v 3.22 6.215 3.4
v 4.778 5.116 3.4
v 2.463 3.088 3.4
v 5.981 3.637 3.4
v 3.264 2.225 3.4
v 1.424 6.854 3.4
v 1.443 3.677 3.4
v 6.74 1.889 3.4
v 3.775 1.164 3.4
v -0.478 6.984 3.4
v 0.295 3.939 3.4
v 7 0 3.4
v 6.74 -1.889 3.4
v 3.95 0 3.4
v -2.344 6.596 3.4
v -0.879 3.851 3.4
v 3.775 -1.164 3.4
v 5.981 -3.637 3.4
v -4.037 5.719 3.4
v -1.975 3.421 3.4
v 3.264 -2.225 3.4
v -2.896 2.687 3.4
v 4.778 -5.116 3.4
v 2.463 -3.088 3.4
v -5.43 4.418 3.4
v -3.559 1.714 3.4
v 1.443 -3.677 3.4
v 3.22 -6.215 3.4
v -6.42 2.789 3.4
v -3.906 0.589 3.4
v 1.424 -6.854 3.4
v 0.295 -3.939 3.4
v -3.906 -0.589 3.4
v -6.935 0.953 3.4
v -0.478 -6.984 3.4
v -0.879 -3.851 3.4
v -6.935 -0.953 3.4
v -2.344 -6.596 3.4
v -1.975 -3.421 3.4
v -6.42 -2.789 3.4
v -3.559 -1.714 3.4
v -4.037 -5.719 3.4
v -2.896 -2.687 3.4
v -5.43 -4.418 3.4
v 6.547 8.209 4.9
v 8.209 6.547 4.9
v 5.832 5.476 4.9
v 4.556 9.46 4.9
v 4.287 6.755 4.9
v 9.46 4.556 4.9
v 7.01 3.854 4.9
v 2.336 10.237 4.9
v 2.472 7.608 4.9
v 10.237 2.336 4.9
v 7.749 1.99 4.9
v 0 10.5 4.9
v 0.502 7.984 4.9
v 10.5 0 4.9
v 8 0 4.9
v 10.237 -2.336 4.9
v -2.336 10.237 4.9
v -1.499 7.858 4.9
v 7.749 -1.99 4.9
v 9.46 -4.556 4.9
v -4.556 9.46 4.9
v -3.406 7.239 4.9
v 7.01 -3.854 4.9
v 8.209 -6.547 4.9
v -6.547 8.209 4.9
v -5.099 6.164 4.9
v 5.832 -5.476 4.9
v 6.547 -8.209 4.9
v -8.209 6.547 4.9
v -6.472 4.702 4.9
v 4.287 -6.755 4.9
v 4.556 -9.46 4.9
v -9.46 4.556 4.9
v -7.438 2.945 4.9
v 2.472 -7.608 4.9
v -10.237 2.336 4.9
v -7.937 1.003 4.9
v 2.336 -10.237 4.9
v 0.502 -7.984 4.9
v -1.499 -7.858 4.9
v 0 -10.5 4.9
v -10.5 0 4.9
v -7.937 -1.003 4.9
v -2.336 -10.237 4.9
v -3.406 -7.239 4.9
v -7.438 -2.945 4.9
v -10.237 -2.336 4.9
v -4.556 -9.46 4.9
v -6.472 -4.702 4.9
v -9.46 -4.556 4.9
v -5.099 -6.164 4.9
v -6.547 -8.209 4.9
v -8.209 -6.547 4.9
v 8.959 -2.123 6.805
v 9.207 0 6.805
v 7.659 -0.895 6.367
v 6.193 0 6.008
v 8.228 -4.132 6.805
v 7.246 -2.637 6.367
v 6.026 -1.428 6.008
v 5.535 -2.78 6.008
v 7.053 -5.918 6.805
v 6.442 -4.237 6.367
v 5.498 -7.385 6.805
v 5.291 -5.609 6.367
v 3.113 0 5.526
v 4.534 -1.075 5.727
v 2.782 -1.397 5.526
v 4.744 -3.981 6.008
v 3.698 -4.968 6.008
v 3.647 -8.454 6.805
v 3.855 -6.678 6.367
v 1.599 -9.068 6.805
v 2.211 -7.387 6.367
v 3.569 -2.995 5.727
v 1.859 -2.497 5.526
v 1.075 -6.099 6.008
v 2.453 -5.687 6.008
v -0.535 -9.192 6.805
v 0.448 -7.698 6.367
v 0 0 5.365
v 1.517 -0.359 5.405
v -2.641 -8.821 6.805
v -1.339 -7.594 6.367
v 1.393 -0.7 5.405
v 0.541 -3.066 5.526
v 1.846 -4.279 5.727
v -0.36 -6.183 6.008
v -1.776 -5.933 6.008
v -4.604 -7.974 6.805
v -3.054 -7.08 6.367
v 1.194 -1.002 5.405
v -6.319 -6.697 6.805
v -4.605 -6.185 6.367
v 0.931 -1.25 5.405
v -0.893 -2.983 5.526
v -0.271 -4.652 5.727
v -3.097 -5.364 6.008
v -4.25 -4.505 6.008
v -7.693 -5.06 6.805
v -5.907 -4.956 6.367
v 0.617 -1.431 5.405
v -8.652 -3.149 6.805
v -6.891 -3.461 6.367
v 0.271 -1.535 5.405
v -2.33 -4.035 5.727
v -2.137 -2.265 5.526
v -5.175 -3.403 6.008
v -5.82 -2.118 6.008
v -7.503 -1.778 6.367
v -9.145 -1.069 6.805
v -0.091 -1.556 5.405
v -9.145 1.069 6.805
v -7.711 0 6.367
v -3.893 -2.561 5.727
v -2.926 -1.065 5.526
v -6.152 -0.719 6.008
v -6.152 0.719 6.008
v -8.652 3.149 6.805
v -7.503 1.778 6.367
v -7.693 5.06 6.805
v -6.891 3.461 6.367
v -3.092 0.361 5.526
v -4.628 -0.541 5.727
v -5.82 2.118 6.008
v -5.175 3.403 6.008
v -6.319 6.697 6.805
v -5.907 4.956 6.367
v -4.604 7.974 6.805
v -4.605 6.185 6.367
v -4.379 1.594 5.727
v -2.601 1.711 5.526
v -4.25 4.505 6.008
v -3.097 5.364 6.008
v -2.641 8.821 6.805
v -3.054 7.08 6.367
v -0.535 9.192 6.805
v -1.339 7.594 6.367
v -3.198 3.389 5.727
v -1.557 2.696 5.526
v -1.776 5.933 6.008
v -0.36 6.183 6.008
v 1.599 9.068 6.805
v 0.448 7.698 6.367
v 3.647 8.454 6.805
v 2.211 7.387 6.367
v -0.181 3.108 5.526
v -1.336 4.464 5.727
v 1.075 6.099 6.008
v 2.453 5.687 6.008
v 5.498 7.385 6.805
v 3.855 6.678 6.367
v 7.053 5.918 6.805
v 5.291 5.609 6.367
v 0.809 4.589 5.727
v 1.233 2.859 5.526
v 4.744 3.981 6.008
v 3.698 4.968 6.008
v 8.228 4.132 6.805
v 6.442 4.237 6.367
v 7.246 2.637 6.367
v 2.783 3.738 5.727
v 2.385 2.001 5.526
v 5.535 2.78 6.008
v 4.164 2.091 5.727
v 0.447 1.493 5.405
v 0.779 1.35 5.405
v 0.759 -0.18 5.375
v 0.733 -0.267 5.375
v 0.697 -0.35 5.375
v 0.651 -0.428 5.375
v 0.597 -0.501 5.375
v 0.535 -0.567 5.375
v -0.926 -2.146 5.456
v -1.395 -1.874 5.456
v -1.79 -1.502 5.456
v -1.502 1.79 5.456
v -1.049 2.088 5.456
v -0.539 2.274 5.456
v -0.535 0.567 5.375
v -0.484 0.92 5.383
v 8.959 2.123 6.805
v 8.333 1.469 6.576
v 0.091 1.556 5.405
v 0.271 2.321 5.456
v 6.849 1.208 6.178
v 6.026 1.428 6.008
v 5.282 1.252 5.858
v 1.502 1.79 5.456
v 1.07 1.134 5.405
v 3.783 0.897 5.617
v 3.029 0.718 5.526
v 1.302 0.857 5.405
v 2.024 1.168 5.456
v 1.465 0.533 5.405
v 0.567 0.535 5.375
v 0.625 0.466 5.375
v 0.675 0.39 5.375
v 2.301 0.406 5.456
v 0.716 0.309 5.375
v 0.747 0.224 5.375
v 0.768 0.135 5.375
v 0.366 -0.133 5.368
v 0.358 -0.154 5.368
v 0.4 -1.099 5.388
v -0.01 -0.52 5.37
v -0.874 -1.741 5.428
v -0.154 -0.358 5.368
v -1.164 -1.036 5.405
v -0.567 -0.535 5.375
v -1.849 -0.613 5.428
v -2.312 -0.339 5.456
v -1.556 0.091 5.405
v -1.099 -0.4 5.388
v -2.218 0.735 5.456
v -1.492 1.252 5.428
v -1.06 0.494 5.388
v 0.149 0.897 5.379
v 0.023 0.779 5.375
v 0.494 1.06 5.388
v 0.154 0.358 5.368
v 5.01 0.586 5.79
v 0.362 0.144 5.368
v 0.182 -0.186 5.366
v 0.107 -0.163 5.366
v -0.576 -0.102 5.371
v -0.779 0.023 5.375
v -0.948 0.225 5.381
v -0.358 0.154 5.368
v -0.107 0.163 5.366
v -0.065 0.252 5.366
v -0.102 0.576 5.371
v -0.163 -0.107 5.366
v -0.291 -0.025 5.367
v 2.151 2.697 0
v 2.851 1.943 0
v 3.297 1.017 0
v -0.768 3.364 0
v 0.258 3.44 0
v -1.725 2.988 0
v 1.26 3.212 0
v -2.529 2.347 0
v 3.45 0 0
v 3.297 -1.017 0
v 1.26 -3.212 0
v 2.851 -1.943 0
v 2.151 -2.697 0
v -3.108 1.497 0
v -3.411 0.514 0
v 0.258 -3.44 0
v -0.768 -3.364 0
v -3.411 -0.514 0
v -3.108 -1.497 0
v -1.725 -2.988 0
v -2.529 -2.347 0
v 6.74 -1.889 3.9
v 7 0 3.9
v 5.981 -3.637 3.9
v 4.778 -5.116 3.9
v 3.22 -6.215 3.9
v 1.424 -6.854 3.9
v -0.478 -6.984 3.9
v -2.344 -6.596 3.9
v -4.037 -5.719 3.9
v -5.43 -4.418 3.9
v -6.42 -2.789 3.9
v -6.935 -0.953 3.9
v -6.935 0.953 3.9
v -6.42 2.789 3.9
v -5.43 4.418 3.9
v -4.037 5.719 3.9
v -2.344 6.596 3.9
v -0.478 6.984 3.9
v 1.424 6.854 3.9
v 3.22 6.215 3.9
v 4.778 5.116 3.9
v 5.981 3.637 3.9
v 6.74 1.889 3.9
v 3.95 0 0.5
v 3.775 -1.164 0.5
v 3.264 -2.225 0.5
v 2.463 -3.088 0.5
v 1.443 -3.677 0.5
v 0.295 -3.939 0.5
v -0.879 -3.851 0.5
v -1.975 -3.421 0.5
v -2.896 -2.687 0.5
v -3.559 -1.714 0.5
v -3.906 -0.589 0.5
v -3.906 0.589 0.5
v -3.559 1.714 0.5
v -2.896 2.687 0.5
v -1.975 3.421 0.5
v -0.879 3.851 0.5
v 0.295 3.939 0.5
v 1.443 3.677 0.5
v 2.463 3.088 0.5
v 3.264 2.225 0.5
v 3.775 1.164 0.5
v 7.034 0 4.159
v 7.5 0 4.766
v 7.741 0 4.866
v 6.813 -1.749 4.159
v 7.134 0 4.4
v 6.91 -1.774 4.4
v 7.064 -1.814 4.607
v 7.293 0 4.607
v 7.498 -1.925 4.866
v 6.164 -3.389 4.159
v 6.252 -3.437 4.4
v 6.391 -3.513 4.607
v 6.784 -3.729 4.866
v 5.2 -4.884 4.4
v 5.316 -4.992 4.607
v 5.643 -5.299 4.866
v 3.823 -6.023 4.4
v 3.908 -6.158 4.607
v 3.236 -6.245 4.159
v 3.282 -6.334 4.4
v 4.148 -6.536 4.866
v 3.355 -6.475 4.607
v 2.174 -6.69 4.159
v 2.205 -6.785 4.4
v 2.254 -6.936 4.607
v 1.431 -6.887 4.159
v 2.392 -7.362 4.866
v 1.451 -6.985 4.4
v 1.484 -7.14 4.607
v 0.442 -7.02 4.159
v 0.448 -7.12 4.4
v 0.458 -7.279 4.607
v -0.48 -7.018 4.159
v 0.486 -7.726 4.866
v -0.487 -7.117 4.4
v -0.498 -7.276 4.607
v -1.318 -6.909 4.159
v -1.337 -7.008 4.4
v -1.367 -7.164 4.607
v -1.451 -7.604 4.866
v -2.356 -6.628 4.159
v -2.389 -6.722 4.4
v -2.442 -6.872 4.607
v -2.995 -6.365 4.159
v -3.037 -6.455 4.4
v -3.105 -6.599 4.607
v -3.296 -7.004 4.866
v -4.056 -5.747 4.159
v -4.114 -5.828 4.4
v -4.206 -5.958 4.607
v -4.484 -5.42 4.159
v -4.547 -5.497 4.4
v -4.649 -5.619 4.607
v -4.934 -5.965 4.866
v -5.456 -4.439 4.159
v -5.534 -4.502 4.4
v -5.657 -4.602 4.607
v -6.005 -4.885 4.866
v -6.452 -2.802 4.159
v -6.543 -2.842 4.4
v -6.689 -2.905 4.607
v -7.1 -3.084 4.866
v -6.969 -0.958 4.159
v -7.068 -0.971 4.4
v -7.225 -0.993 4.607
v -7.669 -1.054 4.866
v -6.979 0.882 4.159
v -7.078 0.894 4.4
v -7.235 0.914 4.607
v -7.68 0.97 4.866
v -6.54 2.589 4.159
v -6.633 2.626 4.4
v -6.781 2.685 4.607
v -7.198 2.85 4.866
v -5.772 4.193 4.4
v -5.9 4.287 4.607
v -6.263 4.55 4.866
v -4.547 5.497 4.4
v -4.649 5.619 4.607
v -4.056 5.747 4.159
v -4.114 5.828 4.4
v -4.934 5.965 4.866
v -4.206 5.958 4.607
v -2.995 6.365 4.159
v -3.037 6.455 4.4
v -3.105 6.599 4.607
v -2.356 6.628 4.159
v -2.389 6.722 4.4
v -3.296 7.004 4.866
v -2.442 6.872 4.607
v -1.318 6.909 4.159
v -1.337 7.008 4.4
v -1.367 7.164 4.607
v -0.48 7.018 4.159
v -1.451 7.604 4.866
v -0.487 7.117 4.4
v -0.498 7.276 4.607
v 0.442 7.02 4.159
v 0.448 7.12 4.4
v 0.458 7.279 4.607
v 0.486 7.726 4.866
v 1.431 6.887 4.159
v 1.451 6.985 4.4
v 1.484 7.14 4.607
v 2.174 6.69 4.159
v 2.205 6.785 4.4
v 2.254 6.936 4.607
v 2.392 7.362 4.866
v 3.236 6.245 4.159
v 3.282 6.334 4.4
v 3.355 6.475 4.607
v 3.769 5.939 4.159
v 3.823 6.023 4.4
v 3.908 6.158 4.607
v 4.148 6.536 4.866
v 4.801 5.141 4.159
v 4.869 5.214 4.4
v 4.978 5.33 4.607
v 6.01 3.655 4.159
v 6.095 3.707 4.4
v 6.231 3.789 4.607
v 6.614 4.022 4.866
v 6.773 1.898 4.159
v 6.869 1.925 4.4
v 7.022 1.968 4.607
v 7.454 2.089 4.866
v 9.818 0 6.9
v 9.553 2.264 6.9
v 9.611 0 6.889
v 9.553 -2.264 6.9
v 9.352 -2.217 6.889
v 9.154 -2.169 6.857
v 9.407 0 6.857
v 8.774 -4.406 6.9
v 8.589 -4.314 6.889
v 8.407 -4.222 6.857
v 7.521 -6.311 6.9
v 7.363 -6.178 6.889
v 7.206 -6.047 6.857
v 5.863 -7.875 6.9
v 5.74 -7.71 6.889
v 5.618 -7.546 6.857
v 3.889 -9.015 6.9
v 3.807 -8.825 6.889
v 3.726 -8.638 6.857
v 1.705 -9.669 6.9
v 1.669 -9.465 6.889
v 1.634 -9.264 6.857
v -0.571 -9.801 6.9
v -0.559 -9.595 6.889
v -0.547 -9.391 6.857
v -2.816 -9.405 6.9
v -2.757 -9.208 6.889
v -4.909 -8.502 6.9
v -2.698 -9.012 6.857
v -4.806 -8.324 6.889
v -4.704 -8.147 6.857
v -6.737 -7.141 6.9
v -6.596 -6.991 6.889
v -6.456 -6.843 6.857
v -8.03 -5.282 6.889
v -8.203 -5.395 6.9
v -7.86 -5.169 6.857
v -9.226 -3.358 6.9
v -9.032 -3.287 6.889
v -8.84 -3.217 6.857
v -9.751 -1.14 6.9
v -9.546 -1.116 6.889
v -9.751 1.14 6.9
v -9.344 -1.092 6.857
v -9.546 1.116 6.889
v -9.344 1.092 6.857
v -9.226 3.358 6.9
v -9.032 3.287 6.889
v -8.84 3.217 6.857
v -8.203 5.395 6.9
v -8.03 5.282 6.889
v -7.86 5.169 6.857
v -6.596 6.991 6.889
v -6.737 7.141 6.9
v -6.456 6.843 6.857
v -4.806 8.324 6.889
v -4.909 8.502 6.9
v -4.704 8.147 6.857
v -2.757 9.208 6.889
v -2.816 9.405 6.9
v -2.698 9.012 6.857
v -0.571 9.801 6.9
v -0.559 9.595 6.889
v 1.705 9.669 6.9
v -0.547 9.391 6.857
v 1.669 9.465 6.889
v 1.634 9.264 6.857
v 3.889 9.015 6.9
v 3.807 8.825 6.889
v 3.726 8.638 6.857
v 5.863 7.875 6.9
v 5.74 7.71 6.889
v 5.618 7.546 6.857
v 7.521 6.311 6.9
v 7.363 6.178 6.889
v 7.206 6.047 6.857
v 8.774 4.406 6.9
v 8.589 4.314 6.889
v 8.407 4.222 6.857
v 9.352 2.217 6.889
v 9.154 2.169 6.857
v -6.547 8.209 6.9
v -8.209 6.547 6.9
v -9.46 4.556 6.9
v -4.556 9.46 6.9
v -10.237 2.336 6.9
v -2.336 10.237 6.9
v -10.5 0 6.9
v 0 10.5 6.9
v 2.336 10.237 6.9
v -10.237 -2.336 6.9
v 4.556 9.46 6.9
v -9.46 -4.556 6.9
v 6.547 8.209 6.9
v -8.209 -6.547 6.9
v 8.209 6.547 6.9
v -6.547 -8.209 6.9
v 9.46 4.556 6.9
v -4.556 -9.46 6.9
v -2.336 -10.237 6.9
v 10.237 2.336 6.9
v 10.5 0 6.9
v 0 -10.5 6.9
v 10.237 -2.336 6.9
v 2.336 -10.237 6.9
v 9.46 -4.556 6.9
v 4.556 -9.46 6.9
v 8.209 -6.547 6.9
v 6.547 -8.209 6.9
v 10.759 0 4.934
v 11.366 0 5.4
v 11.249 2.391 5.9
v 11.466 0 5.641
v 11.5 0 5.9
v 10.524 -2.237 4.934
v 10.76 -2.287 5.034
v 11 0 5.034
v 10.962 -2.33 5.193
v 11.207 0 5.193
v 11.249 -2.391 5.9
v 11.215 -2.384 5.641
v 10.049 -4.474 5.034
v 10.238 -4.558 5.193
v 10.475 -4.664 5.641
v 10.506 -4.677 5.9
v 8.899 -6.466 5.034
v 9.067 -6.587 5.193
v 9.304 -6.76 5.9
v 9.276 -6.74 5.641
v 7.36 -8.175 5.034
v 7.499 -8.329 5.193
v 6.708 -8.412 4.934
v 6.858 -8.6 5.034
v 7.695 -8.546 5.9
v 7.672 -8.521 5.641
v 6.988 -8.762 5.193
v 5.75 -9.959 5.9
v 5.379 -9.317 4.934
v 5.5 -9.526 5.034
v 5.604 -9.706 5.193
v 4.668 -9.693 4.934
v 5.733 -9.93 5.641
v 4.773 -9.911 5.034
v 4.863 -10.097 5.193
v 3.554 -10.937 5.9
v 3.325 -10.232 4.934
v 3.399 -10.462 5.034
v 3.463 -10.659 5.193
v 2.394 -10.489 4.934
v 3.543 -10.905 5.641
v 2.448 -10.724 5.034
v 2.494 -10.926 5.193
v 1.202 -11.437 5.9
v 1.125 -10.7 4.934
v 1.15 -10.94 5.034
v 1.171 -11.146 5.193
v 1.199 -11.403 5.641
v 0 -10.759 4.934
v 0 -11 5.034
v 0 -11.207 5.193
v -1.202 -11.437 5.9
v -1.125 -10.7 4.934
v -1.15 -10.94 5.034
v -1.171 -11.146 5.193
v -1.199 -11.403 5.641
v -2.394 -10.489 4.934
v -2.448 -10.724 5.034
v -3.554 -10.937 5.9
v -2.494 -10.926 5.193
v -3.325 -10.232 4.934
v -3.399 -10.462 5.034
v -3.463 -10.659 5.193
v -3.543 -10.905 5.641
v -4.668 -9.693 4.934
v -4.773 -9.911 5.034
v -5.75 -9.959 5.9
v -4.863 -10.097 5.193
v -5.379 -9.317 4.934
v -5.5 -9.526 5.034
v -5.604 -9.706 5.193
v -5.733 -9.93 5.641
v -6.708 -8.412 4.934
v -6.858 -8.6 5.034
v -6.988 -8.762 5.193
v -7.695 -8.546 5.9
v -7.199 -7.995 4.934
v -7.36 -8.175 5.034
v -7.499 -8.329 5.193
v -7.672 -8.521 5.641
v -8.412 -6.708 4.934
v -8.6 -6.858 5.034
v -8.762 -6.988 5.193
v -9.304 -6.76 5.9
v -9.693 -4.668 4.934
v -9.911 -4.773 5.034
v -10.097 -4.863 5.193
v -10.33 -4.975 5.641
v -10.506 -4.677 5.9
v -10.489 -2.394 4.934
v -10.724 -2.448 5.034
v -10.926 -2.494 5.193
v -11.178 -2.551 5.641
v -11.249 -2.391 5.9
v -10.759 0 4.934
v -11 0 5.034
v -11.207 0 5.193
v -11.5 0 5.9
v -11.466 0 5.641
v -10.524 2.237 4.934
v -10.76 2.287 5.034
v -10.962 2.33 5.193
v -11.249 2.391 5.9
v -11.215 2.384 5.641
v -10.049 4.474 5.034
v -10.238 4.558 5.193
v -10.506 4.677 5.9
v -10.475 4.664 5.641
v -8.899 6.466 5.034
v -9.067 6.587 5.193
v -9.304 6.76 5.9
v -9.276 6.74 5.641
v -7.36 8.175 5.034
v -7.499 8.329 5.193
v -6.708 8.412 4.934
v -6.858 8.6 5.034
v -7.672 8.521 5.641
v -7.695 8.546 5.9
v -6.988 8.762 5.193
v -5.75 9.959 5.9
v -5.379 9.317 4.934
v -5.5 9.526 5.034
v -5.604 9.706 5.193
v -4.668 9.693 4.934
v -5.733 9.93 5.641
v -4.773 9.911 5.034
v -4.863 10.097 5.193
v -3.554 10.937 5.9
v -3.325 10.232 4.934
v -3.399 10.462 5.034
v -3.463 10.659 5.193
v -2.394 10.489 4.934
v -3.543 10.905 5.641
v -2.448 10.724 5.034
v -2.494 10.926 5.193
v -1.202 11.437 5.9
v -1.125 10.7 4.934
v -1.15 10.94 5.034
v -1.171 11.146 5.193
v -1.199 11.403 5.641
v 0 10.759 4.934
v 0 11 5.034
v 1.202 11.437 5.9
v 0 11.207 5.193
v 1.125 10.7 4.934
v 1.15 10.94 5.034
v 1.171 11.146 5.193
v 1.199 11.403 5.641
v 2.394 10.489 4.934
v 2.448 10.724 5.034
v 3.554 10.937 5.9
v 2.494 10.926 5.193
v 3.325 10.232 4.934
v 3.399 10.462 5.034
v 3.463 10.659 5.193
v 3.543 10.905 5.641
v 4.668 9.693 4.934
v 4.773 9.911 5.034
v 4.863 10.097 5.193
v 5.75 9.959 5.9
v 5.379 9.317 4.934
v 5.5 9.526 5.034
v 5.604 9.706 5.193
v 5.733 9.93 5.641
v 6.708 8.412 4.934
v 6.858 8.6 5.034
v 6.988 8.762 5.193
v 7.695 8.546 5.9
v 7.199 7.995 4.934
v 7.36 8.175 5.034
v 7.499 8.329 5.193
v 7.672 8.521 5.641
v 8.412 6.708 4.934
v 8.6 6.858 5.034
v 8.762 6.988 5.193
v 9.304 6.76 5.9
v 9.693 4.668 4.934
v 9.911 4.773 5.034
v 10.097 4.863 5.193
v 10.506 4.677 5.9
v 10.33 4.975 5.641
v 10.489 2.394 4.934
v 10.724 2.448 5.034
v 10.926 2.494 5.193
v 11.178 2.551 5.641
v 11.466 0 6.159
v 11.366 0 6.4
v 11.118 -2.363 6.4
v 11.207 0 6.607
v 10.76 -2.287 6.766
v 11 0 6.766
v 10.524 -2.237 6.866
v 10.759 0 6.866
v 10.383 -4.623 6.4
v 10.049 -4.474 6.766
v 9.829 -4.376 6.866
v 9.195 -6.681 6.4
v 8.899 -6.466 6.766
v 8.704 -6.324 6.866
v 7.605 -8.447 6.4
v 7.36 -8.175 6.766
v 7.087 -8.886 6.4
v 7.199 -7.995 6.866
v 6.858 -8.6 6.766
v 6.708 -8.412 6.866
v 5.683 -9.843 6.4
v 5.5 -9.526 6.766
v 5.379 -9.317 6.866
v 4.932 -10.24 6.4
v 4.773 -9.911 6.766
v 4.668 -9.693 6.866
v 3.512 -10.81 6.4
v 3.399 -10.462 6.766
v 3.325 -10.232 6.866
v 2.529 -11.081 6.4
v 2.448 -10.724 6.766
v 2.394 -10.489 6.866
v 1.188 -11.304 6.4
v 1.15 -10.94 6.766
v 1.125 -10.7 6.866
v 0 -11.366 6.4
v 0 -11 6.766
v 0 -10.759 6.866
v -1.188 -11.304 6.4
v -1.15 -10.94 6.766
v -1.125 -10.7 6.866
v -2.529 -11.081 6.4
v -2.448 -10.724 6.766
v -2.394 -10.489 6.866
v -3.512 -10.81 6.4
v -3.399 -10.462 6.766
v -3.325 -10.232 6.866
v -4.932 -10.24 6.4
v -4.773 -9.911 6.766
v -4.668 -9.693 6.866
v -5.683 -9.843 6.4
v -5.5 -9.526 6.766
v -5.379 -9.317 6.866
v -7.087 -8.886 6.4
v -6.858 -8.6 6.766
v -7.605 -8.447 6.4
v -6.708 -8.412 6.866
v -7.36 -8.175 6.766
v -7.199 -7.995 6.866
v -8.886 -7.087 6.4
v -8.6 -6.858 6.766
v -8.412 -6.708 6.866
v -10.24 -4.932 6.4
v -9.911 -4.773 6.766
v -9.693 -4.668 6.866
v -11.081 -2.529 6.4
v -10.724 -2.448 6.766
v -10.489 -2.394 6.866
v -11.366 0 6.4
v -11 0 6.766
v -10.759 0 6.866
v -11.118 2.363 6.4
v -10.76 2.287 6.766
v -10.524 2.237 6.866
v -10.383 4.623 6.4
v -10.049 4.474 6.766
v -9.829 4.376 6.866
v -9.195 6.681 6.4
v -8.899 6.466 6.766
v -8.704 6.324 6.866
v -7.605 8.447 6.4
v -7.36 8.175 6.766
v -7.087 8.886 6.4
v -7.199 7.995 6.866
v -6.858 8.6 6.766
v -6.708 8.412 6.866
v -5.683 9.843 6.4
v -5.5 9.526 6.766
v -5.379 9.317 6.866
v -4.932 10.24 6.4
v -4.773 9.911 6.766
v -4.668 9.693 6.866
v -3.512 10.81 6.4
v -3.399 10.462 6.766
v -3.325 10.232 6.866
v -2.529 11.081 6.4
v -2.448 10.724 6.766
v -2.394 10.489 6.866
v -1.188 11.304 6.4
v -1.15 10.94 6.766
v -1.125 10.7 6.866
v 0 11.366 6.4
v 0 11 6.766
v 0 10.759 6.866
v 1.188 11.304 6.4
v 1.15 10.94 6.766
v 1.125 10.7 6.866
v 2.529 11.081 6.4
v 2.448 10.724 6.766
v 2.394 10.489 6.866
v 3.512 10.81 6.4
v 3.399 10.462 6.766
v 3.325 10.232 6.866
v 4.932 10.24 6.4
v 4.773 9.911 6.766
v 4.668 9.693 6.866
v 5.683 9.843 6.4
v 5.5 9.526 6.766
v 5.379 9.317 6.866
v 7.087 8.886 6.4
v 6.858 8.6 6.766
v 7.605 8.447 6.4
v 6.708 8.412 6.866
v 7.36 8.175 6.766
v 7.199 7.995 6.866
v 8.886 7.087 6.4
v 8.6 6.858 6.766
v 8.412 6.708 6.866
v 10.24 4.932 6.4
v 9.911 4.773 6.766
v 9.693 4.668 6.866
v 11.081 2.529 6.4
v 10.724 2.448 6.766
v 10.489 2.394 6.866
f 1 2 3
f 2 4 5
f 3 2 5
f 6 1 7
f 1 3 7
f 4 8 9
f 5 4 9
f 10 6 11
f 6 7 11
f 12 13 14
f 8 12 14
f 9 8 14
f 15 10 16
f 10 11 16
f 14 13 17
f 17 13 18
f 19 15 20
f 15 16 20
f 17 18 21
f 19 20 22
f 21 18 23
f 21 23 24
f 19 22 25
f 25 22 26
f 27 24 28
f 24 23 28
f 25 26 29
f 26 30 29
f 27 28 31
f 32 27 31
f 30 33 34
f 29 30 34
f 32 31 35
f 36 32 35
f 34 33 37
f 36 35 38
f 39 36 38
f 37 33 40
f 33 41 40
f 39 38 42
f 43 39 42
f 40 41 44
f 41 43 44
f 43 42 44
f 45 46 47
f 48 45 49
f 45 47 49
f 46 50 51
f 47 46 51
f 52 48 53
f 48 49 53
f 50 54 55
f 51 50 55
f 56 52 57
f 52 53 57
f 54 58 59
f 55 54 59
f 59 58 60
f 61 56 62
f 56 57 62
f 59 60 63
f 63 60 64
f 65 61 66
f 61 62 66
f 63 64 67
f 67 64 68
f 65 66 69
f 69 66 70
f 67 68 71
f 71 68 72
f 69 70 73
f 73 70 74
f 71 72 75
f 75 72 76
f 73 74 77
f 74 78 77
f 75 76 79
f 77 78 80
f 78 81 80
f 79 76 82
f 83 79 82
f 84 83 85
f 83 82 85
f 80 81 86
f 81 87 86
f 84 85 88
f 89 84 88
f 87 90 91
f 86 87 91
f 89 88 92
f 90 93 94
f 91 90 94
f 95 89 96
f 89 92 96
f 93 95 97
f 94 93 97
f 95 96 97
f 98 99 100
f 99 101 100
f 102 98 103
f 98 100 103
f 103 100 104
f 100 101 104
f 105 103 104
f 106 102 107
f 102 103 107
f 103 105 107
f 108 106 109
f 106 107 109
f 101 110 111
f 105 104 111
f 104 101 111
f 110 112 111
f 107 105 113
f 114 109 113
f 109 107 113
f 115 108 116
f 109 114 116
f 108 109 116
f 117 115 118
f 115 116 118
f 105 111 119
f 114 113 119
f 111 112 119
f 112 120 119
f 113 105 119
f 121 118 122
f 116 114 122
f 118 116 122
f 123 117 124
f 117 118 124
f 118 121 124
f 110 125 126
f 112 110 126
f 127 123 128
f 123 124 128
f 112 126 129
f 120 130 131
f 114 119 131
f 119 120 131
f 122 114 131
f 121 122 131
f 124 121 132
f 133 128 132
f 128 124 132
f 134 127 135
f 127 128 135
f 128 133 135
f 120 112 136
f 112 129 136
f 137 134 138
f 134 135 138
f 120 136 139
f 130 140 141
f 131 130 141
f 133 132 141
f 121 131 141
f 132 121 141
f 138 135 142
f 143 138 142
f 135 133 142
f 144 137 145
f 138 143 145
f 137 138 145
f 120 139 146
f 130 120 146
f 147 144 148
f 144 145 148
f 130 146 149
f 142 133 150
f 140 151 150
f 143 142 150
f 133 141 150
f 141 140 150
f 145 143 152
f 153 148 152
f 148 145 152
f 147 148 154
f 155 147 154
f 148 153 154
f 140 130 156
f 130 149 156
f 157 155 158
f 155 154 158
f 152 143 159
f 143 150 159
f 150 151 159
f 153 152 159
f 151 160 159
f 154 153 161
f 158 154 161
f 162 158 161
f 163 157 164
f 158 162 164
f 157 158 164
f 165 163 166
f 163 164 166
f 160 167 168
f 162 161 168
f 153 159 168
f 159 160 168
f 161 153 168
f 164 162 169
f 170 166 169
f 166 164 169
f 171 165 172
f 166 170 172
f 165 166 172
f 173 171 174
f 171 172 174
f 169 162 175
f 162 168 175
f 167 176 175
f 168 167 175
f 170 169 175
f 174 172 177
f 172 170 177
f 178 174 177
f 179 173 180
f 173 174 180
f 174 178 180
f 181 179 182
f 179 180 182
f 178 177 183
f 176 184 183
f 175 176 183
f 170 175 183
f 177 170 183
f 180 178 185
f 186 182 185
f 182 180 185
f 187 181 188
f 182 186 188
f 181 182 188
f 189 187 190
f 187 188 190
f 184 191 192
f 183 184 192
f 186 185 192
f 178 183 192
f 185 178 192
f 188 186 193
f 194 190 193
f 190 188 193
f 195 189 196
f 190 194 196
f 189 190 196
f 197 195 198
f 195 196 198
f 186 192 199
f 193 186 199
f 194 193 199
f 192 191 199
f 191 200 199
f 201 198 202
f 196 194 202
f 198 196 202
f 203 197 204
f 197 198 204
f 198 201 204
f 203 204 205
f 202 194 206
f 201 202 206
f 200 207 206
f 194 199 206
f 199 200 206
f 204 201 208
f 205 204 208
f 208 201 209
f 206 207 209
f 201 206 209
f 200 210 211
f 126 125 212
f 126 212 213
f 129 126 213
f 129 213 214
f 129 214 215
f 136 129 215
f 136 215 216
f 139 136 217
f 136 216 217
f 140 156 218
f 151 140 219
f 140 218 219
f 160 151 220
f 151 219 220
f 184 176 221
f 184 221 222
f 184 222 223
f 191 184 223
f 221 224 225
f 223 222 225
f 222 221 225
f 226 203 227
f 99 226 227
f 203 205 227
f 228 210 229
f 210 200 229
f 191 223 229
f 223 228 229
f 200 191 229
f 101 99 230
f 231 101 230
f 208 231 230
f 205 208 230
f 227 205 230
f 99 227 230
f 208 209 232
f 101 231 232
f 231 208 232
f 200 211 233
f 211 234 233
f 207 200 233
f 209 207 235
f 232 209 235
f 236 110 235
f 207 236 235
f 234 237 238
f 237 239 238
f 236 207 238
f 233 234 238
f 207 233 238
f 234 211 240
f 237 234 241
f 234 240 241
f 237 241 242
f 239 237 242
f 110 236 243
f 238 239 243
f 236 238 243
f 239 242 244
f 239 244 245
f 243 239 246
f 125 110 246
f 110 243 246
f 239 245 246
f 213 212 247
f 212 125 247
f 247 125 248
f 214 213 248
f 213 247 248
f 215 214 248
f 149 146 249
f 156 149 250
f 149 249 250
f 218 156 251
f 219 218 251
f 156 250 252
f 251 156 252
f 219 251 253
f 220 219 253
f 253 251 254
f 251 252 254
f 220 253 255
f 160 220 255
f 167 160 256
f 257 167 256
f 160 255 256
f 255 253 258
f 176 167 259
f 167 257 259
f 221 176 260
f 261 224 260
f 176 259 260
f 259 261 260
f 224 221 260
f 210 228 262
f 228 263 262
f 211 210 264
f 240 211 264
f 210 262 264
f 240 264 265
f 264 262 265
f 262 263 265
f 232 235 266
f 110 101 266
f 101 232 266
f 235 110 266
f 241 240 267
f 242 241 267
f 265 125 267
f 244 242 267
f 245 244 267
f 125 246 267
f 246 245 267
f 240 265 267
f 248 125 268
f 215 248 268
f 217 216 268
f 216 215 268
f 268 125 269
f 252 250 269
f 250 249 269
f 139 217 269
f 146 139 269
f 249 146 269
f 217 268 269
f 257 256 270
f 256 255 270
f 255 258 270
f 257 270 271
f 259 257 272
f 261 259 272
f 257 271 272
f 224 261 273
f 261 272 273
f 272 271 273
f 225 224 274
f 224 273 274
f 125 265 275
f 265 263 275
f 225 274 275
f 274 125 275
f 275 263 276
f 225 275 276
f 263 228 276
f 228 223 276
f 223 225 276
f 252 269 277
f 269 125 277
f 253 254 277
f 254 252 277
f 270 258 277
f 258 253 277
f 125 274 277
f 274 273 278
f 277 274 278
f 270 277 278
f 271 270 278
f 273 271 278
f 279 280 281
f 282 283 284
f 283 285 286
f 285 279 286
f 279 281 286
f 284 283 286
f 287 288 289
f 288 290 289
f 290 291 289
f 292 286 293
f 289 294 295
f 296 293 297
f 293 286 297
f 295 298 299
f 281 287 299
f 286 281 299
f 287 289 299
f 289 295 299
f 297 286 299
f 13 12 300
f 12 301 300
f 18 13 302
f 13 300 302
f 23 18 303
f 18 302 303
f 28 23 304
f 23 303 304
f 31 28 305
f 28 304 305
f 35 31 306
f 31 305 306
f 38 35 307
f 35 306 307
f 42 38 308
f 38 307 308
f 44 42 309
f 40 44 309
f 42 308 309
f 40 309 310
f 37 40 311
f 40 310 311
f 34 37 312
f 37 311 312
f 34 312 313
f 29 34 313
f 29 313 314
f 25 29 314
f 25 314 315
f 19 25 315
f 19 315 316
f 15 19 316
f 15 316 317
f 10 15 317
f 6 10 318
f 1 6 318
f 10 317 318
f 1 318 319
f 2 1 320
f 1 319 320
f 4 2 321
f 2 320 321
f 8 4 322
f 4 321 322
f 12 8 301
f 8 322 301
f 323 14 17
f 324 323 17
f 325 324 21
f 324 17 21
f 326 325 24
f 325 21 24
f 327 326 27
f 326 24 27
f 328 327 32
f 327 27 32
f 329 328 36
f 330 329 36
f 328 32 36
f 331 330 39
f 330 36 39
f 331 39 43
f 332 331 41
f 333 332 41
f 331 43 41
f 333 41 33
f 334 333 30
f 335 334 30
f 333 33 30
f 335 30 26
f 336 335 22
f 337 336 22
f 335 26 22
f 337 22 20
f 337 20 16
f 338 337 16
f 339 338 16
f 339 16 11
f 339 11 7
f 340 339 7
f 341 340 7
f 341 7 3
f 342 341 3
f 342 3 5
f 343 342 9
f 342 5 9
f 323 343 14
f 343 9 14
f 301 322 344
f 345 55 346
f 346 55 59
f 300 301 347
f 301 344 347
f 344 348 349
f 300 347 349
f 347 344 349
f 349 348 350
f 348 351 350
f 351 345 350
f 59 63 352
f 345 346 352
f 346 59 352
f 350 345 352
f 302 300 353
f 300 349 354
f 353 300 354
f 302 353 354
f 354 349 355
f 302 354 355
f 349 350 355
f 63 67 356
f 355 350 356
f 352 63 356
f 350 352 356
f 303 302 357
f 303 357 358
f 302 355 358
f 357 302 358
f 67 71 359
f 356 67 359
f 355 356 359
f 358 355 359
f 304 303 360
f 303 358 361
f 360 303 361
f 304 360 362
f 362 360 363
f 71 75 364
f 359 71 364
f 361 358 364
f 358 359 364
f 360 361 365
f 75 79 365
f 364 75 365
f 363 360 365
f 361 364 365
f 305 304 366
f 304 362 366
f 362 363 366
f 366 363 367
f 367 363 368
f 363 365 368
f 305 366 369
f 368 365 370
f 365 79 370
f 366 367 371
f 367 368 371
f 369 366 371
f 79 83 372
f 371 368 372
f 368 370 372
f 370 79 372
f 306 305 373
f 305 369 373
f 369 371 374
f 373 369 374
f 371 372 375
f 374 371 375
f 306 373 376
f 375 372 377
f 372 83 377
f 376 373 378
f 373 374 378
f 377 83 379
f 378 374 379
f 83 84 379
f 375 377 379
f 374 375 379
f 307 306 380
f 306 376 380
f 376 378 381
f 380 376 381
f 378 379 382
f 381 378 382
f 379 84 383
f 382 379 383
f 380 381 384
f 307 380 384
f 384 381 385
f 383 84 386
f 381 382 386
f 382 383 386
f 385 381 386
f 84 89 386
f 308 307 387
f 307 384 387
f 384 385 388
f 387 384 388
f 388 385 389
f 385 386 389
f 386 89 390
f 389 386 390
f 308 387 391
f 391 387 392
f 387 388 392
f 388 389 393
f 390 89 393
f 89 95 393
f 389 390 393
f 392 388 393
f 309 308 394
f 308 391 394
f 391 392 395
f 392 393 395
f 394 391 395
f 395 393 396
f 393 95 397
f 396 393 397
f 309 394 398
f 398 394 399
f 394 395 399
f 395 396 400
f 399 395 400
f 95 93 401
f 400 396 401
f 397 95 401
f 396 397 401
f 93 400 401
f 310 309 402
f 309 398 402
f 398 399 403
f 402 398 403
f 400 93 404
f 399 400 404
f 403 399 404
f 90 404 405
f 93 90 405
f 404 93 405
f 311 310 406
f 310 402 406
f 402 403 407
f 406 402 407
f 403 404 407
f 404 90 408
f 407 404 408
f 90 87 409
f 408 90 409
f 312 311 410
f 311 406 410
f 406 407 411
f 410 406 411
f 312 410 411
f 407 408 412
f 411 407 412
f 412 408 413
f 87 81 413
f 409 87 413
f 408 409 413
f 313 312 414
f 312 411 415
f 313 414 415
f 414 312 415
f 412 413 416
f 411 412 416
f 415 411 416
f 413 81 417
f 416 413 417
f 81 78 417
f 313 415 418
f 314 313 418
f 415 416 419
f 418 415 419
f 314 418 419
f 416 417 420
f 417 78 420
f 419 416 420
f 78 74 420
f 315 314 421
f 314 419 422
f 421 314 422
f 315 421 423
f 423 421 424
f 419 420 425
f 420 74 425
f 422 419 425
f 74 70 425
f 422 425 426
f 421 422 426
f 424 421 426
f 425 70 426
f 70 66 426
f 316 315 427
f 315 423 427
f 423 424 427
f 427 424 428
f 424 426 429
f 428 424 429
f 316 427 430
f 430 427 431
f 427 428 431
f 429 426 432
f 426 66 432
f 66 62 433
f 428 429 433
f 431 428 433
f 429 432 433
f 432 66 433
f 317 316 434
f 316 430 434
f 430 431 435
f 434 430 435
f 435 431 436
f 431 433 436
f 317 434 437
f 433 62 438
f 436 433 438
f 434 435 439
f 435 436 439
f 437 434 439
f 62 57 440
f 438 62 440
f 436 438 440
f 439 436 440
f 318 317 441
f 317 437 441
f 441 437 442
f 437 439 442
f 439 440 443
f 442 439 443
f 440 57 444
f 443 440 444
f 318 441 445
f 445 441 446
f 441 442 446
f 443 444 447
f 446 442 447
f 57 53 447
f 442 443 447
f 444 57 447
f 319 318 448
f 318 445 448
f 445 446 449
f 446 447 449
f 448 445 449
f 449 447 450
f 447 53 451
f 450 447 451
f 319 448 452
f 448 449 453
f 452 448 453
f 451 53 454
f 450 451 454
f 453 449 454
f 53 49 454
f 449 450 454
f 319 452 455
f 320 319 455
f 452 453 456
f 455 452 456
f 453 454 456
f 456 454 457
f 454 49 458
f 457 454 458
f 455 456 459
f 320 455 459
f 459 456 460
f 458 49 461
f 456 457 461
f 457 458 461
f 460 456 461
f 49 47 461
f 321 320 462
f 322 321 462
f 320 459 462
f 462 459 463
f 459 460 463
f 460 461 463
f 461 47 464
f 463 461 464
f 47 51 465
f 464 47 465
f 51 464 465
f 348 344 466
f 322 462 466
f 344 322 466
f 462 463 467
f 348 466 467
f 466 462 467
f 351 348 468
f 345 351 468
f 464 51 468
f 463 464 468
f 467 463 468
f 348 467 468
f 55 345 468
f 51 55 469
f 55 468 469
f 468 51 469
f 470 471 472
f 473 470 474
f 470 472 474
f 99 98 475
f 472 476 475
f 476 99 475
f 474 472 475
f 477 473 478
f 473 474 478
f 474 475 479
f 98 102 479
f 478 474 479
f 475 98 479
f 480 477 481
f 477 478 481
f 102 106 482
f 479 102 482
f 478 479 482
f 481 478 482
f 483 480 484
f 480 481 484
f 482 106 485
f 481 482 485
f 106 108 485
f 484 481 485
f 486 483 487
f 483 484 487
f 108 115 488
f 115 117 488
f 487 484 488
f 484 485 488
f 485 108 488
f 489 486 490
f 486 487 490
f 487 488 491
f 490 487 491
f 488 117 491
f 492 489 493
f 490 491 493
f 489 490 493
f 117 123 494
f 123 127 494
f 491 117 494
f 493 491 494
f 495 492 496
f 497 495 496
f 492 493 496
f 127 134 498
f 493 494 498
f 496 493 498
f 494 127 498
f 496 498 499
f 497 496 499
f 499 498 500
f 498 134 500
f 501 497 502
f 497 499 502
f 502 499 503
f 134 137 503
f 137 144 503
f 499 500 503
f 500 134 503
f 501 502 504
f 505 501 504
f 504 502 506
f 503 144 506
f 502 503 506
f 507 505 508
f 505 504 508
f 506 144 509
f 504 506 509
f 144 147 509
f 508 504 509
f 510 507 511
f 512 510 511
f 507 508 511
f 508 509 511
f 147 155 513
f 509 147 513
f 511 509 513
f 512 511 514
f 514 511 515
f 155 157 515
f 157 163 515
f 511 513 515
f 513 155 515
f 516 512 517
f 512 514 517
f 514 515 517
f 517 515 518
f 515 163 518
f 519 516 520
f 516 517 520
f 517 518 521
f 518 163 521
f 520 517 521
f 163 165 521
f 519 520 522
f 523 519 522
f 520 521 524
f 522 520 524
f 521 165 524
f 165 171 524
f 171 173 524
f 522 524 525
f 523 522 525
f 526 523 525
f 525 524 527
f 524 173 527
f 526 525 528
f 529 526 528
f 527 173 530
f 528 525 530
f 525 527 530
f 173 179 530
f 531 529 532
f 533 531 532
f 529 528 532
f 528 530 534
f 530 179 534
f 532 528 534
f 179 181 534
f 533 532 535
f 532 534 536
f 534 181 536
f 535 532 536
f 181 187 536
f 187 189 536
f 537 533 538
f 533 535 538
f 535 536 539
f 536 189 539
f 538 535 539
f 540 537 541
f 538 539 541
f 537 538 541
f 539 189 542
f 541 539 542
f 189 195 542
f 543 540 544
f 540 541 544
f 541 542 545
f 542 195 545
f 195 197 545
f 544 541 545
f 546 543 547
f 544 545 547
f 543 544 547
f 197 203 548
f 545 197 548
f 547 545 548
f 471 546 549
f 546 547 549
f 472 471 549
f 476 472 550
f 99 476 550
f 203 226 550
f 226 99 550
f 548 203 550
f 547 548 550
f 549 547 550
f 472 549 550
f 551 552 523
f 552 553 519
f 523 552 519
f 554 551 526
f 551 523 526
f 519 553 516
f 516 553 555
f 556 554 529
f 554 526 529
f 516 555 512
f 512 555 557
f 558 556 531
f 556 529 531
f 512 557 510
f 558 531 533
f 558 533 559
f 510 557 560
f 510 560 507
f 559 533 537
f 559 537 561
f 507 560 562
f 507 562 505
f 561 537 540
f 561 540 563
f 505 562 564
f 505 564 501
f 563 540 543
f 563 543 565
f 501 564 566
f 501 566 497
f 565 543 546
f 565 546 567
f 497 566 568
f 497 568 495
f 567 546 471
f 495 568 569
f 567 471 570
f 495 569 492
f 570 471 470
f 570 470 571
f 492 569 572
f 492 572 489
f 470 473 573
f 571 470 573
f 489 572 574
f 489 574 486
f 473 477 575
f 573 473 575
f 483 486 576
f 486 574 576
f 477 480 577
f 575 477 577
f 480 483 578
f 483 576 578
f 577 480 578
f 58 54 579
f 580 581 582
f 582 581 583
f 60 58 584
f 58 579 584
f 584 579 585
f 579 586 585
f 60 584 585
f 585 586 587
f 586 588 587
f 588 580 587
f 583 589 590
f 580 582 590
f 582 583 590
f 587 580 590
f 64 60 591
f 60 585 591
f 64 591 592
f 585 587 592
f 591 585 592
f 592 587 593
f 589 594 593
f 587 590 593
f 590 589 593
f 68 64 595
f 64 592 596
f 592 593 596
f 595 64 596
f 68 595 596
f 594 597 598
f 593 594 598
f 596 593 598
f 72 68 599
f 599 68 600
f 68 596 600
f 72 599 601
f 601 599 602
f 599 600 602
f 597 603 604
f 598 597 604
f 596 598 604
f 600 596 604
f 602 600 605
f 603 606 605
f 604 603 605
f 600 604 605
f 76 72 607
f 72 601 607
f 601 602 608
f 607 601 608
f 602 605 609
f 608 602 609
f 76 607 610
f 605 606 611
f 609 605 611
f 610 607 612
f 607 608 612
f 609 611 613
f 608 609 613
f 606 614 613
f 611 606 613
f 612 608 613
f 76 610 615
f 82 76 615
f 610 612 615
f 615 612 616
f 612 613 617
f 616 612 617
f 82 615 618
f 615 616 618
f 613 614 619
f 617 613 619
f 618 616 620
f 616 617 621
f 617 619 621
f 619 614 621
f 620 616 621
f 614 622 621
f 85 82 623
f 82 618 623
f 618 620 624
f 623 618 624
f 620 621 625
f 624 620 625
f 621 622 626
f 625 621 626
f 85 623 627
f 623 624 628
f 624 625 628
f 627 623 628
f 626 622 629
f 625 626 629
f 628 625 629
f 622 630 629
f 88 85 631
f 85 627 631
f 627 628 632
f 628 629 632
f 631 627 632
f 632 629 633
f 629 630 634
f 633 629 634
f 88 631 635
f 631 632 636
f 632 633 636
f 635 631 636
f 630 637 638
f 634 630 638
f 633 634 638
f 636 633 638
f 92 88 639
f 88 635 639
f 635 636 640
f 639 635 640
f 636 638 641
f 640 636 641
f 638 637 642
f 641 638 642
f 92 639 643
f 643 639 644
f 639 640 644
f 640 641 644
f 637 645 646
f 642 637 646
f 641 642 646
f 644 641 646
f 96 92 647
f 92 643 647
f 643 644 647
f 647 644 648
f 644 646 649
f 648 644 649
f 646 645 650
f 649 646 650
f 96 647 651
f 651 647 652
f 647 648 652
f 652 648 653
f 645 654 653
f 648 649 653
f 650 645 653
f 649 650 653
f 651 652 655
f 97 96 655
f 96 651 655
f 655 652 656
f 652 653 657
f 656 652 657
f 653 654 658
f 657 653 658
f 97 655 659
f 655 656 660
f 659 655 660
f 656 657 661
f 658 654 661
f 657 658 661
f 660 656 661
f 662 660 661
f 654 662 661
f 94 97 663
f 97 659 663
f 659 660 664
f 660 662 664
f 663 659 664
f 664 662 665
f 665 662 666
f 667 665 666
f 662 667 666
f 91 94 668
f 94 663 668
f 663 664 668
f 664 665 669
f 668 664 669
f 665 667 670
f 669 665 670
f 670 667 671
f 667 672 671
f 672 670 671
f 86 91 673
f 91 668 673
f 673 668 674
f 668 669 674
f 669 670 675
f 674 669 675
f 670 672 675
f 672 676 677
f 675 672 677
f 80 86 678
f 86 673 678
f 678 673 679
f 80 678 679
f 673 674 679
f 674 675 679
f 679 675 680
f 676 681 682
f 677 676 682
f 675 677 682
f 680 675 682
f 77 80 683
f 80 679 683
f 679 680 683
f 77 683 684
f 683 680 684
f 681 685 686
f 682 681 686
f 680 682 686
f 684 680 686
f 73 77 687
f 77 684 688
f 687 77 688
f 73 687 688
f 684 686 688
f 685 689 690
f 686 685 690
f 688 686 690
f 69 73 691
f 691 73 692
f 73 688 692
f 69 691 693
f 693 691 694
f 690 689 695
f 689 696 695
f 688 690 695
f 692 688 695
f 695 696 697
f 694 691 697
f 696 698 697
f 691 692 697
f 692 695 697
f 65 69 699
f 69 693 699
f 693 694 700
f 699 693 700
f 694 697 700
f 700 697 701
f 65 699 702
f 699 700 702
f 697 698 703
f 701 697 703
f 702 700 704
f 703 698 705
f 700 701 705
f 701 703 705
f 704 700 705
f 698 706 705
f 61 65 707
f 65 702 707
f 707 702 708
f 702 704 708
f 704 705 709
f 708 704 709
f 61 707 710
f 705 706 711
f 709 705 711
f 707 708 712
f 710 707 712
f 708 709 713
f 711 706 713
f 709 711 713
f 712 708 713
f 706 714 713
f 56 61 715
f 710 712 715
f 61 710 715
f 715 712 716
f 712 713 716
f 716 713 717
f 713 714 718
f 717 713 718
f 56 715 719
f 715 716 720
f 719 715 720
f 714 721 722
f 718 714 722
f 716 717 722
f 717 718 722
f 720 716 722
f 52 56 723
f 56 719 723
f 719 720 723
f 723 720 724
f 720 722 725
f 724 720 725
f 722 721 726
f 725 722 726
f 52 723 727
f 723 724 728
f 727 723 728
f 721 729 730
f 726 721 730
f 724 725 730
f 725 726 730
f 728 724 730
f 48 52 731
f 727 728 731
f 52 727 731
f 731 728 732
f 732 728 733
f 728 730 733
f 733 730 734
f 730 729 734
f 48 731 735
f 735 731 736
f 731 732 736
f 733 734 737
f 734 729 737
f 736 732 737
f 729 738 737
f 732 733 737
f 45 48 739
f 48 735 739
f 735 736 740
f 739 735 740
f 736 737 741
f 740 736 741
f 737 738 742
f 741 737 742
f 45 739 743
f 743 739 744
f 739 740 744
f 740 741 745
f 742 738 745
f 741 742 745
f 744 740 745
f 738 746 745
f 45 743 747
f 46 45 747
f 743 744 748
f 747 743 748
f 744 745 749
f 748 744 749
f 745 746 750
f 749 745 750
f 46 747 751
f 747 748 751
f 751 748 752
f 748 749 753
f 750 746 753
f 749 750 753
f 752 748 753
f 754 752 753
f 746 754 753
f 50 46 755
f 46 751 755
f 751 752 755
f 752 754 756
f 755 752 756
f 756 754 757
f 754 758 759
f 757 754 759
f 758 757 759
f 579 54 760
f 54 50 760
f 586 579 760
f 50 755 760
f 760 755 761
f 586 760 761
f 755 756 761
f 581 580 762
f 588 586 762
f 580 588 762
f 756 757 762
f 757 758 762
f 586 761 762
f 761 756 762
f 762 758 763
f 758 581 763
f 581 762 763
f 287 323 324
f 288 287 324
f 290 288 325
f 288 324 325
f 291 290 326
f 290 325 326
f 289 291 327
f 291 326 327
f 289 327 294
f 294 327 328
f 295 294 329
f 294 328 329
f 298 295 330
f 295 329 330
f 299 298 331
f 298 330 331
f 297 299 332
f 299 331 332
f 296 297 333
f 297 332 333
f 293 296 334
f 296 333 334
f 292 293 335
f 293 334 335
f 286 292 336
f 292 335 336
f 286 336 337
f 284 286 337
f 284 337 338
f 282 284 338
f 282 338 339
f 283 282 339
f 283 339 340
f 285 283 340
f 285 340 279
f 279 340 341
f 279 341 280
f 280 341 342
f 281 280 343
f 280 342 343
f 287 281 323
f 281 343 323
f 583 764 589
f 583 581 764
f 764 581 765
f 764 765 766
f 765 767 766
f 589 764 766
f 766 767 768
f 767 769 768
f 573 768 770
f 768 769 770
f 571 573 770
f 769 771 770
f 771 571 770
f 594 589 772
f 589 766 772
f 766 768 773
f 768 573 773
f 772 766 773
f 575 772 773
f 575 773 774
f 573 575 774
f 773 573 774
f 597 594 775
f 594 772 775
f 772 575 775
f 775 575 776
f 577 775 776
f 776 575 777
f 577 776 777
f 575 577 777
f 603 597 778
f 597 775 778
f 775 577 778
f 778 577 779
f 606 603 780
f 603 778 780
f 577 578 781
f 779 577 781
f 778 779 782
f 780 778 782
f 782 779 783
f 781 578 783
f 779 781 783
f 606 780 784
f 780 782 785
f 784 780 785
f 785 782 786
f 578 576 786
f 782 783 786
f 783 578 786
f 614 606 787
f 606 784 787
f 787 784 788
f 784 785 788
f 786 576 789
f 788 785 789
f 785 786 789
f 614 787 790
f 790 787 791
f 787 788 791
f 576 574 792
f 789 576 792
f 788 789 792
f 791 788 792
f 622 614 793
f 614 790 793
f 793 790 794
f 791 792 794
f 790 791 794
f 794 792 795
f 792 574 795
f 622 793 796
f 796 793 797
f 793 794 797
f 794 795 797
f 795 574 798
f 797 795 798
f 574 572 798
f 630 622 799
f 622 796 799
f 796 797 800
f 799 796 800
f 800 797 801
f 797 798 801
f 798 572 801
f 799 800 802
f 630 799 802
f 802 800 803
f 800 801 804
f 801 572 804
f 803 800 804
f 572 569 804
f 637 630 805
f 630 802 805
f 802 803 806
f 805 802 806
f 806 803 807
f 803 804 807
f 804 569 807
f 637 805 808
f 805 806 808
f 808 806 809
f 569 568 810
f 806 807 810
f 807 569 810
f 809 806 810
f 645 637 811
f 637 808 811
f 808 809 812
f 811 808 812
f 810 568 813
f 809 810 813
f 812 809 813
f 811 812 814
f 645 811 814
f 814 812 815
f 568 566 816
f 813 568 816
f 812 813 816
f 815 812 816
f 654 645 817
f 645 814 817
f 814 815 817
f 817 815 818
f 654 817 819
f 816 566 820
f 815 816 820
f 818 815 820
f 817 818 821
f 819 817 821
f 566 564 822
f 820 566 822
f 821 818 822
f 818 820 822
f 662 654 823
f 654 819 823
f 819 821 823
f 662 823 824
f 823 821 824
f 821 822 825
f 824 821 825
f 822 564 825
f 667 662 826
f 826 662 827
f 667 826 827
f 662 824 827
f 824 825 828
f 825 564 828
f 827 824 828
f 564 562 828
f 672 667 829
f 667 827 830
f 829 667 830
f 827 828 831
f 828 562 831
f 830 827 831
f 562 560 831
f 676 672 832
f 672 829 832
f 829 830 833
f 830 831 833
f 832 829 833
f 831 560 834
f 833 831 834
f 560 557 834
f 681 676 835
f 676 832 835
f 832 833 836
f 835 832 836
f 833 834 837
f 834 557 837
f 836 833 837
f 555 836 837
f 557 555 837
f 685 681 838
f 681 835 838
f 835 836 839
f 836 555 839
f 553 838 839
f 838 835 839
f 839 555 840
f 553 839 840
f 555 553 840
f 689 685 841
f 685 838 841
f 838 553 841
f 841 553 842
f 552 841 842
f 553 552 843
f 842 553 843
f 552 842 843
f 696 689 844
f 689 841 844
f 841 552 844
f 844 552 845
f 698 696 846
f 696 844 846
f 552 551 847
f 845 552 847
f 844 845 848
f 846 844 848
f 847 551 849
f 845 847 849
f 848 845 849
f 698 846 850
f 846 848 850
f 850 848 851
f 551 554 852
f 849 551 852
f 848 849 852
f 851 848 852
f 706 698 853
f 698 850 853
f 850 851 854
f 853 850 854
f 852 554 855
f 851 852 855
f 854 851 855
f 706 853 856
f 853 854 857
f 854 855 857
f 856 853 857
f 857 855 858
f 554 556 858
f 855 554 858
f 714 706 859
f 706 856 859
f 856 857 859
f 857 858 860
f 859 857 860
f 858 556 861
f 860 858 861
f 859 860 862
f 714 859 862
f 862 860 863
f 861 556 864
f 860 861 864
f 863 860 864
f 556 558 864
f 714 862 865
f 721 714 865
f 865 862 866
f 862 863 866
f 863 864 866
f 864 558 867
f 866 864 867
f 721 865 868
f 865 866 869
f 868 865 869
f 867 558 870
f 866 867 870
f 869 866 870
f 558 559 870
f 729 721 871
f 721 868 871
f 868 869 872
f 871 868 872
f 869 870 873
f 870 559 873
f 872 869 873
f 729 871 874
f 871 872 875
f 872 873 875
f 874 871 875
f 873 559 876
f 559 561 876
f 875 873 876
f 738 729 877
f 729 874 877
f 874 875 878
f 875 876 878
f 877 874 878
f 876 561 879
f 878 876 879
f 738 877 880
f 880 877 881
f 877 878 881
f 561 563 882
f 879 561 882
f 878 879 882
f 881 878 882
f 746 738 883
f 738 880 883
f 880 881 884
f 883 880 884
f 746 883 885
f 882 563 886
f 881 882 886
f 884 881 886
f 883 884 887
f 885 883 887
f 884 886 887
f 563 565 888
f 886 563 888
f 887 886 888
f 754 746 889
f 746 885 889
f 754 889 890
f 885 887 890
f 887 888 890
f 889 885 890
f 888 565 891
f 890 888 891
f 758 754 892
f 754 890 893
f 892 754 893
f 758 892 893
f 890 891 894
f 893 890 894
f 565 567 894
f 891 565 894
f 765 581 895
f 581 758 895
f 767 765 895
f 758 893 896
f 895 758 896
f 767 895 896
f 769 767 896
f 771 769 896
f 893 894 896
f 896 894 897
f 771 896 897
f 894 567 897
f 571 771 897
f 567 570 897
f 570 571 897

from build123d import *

# Parameters (mm, degrees)
F2_SIZE = 0.5


with BuildPart() as f1:
    # F0 (on Front) → F1 (revolve)
    with BuildSketch(Plane.XZ):
        with BuildLine():
            Line((0, 5.365184), (0, 0))
            Line((0, 0), (3.95, 0))
            Line((3.95, 0), (3.95, 3.4))
            Line((3.95, 3.4), (7, 3.4))
            Line((7, 3.4), (7, 3.9))
            ThreePointArc((7, 3.9), (7.292893, 4.607107), (8, 4.9))
            Line((8, 4.9), (10.5, 4.9))
            ThreePointArc((10.5, 4.9), (11.207107, 5.192893), (11.5, 5.9))
            ThreePointArc((11.5, 5.9), (11.207107, 6.607107), (10.5, 6.9))
            Line((10.5, 6.9), (9.817803, 6.9))
            ThreePointArc((9.817803, 6.9), (9.508896, 6.876), (9.207402, 6.804576))
            ThreePointArc((9.207402, 6.804576), (4.659616, 5.727204), (0, 5.365184))
        make_face()
    revolve(axis=Axis((0, 0, 2.682592), (0, 0, -1)))

    # F2
    f2_edges = [f1.edges().sort_by_distance(p)[0] for p in [
        (-3.95, 0, 0),
    ]]
    chamfer(f2_edges, length=F2_SIZE)


solid = f1.part
